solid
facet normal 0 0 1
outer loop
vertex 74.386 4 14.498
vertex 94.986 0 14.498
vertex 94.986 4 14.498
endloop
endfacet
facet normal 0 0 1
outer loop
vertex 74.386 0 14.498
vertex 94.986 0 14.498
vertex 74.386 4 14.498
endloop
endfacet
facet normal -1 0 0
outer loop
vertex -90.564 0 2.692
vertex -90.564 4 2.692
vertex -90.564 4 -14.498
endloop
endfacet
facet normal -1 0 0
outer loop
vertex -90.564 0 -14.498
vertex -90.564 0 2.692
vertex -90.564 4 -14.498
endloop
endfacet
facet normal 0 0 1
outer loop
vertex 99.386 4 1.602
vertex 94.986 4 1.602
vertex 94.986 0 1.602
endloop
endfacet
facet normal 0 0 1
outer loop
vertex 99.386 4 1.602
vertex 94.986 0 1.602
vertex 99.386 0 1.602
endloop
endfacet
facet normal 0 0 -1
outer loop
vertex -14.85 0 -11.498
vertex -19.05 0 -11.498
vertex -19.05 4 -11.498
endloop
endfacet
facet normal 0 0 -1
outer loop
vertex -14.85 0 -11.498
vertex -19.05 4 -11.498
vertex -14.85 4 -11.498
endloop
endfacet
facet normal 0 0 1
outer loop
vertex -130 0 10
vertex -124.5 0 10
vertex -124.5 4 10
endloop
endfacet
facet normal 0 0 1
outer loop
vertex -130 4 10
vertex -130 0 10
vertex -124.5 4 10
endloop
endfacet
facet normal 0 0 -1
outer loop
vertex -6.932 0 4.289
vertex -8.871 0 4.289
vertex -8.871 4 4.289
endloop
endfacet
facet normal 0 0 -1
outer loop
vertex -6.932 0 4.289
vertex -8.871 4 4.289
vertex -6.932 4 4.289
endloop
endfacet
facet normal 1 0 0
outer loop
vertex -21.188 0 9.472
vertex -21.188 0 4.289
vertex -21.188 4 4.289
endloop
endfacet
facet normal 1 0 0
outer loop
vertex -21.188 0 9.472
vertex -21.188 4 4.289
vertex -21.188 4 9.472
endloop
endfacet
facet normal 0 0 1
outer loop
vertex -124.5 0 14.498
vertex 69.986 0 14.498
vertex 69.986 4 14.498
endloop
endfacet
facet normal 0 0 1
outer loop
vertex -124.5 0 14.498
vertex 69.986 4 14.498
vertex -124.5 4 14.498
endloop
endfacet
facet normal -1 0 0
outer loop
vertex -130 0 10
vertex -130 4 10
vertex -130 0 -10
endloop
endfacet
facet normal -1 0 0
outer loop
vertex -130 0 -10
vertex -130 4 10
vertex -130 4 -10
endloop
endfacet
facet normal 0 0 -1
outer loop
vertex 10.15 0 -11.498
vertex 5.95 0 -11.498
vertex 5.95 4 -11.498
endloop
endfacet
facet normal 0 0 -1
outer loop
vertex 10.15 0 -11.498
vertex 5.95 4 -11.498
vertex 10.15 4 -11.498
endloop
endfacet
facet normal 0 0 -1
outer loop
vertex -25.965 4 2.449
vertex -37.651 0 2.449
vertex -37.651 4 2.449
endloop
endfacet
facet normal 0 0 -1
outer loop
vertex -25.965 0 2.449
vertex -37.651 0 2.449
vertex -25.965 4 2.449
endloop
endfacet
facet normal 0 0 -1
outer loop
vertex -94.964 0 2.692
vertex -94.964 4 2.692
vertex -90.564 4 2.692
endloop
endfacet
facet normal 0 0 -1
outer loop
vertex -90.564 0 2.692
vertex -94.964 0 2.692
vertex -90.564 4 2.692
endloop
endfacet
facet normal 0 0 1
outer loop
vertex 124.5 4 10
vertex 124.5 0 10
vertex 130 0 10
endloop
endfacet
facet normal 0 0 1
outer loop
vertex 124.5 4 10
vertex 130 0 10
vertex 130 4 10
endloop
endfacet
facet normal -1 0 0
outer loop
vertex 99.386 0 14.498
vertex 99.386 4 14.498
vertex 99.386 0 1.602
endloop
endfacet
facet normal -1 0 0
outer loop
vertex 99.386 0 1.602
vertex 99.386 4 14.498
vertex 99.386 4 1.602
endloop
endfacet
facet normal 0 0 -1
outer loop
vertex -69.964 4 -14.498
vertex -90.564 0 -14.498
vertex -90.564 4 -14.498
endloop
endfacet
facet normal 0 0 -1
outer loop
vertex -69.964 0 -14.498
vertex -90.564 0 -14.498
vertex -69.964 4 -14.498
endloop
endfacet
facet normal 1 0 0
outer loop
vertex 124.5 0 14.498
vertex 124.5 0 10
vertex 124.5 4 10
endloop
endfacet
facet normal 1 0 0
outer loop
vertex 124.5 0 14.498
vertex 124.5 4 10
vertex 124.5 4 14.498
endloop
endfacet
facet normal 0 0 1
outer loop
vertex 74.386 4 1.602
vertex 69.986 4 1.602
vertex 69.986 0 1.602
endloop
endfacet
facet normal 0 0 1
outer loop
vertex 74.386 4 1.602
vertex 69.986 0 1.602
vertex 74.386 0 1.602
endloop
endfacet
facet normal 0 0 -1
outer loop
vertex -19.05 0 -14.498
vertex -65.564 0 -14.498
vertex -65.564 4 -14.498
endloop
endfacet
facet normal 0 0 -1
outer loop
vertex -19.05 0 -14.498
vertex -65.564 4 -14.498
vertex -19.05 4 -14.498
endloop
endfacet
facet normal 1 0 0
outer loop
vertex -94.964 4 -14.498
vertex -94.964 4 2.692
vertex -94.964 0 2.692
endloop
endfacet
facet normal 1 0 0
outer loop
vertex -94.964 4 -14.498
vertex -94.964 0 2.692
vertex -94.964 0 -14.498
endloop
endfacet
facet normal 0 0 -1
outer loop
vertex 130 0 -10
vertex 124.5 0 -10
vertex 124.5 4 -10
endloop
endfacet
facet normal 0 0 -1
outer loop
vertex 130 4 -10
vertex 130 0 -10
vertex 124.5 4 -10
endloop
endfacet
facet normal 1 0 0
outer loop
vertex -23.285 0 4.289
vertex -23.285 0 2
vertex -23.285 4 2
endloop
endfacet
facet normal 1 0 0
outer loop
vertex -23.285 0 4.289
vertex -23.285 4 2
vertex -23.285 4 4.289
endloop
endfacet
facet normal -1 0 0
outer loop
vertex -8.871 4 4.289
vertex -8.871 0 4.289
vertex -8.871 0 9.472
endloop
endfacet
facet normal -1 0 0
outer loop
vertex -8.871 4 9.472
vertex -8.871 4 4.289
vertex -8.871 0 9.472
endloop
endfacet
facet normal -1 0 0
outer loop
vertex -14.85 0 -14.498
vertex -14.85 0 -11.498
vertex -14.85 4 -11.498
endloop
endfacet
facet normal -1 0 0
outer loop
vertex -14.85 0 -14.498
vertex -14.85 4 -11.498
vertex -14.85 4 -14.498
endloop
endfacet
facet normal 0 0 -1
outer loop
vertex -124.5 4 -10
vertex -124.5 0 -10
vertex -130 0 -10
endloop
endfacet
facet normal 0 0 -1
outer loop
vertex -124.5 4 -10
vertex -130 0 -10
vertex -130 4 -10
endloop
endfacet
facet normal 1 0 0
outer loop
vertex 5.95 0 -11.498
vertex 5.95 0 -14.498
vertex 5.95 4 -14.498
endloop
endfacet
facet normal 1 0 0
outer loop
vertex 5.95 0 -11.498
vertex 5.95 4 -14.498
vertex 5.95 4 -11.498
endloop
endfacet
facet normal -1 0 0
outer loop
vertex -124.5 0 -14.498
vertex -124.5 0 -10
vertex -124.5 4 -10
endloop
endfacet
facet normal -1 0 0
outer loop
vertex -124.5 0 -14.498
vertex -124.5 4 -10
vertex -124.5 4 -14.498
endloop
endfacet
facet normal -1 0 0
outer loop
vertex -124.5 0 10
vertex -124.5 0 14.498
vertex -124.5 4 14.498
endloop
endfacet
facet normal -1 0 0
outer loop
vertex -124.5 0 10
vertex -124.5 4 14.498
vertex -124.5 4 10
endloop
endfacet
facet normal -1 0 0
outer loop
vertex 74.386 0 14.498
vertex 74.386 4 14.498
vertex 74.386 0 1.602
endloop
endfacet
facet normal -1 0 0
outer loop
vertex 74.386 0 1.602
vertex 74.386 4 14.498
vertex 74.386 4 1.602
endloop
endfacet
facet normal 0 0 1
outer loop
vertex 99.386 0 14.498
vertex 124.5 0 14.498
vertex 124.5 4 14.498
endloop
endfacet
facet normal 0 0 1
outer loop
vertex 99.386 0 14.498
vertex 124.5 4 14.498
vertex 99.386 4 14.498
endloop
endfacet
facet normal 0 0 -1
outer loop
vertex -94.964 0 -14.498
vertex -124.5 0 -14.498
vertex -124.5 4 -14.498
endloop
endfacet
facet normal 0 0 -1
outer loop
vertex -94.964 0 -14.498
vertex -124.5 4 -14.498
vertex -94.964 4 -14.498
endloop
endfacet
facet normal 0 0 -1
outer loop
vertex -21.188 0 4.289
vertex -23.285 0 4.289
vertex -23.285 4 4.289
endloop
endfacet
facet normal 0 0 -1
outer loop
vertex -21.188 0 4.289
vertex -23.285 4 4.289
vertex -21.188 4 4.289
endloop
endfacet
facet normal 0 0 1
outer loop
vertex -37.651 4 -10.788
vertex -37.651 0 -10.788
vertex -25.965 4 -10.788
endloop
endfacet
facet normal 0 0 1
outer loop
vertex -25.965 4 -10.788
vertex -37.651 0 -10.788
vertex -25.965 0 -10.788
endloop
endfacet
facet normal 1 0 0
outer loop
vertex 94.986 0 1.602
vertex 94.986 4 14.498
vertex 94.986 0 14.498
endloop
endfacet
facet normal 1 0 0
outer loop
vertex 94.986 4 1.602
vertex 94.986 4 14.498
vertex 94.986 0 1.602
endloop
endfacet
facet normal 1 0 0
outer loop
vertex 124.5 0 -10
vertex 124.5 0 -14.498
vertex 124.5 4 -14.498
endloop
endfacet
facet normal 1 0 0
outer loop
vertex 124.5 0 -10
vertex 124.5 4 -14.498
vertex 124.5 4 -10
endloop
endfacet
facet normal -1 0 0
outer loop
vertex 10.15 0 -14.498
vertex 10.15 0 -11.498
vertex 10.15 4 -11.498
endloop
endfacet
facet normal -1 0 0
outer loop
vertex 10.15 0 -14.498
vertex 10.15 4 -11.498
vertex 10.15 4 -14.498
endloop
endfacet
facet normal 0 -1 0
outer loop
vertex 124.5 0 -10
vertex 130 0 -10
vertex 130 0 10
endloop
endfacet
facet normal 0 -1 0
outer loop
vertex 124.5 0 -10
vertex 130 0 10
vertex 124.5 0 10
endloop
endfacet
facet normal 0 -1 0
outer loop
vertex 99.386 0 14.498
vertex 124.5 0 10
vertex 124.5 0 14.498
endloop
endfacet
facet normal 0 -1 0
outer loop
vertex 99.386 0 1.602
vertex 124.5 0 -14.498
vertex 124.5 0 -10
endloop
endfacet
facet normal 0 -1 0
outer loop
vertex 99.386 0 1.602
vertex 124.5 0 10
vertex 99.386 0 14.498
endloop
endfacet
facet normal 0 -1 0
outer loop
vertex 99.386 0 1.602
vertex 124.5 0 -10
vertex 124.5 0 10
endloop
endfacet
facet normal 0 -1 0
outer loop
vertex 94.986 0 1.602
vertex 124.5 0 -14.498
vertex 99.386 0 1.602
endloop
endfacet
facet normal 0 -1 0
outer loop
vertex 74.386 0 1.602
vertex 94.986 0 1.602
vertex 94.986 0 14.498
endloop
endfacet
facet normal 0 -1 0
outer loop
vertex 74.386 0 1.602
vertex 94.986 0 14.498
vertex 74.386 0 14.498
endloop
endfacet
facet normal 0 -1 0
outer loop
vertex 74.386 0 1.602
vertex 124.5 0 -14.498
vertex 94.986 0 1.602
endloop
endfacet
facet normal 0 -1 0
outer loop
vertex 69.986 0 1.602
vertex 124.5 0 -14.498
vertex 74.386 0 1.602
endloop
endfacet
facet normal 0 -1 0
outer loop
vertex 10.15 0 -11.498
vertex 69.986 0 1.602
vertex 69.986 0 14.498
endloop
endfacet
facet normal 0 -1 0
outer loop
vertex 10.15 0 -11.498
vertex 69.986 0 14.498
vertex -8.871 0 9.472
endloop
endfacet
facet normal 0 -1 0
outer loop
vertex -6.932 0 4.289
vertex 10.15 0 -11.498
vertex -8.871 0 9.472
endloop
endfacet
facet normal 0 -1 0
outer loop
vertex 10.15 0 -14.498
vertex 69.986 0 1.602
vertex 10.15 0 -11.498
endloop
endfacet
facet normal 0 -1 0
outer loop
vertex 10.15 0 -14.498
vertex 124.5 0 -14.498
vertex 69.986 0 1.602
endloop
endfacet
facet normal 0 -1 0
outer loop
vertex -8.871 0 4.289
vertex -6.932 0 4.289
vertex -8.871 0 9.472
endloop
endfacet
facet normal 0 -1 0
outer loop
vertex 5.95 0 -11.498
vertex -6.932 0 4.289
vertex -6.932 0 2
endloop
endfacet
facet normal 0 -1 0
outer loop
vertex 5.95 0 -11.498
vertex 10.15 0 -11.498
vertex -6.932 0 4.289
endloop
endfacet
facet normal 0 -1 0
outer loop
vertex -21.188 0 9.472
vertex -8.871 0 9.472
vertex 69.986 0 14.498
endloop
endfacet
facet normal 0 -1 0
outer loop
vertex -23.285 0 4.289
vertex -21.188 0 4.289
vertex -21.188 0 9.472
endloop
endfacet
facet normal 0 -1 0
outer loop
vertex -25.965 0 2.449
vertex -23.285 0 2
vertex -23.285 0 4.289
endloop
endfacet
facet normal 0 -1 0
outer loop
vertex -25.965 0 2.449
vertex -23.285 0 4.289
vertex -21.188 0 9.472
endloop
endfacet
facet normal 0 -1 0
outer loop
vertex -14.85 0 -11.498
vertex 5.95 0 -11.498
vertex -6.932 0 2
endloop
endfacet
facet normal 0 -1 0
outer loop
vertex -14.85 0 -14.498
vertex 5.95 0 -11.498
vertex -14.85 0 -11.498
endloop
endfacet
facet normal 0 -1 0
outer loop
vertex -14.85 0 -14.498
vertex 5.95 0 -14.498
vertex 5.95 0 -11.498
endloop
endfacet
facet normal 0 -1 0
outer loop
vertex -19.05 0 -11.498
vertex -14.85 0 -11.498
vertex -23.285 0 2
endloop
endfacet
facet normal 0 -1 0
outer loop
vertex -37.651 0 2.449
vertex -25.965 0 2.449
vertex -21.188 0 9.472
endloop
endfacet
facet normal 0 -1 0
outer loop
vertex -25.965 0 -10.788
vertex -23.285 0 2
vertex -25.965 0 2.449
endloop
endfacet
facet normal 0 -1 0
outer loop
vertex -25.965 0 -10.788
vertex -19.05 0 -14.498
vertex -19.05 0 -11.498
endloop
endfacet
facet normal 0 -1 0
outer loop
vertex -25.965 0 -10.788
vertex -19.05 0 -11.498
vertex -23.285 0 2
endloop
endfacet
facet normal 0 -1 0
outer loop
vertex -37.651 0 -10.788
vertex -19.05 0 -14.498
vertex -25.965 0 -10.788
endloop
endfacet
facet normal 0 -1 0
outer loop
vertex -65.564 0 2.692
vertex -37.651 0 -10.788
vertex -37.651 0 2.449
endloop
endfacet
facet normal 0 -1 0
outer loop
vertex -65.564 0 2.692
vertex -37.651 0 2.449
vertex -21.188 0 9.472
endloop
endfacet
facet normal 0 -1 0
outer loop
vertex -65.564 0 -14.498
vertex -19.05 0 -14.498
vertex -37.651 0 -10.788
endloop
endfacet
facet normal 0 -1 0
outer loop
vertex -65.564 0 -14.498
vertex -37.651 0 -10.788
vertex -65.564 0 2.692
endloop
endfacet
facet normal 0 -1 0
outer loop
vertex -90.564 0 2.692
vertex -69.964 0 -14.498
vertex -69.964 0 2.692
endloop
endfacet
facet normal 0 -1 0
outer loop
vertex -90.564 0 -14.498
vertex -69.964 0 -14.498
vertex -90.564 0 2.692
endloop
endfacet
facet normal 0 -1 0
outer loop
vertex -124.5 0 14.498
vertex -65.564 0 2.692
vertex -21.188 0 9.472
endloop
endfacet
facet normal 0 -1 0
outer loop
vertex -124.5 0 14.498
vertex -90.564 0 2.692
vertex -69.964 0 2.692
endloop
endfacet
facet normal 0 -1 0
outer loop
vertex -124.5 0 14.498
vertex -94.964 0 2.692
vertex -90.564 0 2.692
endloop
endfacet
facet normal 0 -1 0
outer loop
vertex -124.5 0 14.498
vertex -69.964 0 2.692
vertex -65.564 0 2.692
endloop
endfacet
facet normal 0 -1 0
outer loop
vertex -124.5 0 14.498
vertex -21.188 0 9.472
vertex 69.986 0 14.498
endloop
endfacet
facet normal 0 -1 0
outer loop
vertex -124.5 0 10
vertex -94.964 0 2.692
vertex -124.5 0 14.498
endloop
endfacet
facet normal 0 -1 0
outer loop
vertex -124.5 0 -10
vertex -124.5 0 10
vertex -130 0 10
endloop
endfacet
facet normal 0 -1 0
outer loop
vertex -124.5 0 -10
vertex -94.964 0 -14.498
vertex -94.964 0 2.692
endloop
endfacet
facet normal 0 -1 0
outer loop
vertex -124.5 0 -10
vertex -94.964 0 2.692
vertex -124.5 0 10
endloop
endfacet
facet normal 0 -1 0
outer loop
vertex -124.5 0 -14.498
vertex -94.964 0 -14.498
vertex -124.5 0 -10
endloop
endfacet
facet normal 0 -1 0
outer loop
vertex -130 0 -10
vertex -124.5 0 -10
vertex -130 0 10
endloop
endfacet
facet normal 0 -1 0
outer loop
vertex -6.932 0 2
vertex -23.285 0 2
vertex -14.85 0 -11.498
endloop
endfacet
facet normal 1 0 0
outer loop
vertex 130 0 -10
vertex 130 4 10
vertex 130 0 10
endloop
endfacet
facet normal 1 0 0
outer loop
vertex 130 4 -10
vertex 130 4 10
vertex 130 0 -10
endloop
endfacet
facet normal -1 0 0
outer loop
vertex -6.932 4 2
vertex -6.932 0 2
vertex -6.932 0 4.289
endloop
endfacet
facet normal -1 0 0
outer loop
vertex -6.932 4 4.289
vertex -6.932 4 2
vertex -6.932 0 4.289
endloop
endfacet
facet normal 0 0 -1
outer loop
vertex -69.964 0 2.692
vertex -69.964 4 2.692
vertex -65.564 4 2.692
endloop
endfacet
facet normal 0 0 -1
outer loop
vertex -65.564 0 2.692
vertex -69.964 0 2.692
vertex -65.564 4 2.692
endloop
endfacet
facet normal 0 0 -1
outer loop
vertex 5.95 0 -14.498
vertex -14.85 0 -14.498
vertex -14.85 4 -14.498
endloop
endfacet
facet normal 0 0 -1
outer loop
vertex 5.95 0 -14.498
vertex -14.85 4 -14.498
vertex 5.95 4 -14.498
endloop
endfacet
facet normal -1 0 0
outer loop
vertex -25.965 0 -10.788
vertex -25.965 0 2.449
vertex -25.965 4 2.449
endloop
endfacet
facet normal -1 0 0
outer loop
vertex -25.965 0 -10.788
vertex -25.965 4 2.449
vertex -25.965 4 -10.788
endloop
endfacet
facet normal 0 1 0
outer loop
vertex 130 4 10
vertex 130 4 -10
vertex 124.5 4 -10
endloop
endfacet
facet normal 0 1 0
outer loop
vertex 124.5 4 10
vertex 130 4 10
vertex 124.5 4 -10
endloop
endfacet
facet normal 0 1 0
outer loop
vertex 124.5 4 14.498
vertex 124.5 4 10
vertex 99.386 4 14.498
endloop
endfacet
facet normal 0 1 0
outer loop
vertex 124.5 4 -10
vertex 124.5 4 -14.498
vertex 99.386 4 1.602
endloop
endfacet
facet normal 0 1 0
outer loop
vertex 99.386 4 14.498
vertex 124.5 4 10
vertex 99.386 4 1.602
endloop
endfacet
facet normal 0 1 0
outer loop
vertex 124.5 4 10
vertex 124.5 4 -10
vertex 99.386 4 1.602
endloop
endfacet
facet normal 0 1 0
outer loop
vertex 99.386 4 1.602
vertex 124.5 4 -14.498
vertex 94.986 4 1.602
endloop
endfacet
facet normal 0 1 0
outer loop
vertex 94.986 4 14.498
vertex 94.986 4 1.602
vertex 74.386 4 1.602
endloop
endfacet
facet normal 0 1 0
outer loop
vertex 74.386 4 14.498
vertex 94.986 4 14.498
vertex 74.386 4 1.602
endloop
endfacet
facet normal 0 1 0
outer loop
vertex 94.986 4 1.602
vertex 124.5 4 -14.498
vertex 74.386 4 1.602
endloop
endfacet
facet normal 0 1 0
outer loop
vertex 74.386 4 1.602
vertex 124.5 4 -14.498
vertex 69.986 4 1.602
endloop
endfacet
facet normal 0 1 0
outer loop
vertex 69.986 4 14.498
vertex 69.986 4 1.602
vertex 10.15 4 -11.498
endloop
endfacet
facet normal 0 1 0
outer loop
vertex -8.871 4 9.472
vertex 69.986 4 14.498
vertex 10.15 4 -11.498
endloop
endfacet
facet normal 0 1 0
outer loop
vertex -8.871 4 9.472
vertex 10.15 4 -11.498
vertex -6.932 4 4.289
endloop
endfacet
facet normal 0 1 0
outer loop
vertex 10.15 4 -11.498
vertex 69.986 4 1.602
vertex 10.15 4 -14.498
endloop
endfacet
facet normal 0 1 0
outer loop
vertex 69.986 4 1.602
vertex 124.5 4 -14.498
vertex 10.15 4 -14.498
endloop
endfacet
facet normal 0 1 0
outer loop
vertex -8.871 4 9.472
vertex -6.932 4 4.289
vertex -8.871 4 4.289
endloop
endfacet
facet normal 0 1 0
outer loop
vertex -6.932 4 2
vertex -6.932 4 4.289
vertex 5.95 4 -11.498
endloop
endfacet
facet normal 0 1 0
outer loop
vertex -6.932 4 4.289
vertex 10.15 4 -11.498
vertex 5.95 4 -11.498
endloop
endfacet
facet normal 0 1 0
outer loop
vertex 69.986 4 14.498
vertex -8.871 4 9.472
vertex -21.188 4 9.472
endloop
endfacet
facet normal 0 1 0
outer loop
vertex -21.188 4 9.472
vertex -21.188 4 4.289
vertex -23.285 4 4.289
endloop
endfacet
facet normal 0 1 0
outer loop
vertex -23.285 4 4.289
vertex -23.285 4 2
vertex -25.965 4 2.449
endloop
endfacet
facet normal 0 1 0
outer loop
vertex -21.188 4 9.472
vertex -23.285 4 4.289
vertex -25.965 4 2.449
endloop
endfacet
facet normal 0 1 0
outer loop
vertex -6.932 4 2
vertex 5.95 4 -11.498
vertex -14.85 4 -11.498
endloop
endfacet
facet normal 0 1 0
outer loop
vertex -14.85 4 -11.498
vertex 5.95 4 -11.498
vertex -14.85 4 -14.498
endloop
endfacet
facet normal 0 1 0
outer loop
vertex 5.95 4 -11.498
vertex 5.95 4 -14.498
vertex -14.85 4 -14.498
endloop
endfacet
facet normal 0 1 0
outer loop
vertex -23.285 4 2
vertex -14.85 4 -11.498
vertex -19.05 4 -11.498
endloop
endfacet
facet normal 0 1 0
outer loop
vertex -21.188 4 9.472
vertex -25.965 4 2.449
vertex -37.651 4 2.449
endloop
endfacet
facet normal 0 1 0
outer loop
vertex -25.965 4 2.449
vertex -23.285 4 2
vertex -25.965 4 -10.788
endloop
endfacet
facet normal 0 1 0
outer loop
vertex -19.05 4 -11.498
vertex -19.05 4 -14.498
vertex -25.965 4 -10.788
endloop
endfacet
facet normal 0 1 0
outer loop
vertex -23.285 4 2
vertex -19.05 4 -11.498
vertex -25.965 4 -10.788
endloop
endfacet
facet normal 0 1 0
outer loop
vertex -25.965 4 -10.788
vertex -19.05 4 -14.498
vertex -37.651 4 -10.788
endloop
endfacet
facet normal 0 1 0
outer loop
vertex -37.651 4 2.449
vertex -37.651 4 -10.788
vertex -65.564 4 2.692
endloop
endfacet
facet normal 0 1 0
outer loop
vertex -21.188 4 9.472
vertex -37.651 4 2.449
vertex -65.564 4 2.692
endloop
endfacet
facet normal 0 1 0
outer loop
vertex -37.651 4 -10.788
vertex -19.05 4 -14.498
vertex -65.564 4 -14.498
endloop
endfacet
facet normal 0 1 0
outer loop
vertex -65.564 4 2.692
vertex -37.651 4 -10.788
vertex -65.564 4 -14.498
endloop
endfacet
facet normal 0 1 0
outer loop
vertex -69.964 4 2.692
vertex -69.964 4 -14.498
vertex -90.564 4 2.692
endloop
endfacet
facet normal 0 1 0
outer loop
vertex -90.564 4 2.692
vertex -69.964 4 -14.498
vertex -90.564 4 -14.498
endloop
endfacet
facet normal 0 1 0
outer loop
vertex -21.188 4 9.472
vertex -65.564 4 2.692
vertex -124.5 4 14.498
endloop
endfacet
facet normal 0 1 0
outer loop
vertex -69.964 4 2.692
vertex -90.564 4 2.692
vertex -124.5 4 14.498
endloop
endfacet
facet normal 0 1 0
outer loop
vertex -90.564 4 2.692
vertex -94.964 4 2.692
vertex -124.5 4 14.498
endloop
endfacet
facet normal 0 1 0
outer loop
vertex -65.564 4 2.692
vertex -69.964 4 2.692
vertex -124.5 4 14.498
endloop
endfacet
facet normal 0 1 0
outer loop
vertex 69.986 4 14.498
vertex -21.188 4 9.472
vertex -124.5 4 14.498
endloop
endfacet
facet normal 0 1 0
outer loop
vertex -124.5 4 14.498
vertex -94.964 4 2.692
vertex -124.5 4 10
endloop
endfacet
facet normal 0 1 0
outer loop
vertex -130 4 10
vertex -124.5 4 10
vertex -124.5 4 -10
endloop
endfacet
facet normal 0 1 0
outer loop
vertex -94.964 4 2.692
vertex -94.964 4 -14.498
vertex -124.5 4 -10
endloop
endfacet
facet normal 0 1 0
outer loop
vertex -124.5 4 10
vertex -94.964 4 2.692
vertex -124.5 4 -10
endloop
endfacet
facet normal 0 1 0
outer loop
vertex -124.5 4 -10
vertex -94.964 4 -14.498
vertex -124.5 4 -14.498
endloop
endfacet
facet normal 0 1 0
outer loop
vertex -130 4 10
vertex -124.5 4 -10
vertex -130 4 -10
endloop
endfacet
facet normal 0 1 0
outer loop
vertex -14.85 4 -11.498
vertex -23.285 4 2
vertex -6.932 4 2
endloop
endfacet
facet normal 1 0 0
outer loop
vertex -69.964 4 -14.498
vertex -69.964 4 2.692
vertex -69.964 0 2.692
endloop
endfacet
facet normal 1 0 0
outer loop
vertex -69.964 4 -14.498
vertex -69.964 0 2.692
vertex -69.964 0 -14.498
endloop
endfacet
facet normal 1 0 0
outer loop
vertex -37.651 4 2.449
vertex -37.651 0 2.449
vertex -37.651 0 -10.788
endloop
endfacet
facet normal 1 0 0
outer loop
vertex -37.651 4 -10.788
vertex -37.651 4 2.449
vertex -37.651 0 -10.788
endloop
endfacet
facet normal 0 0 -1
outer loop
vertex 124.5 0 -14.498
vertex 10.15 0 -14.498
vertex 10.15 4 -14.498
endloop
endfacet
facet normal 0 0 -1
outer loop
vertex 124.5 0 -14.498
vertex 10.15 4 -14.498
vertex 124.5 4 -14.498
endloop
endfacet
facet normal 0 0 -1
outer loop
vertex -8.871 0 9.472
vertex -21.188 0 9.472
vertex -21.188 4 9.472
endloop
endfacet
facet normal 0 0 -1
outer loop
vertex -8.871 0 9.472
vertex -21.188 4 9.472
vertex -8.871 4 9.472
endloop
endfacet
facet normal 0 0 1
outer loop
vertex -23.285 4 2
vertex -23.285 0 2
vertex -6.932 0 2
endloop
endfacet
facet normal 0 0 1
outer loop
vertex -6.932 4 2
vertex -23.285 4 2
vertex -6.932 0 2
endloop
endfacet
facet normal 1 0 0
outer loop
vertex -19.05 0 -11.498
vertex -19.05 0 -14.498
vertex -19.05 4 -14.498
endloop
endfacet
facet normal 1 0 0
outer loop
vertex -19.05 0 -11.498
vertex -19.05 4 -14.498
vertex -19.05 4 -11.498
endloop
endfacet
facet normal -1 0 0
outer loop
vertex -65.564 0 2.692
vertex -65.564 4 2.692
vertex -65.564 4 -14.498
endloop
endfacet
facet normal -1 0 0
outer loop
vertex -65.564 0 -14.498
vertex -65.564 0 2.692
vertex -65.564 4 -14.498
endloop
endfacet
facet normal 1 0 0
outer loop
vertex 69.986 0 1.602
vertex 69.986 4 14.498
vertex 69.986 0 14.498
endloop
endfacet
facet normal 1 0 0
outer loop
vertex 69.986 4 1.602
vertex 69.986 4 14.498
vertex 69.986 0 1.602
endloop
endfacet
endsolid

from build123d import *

# Parameters (mm, degrees)
EXTRUDE_1_DEPTH    = 4
SKETCH_2_W         = 20
SKETCH_2_H         = 4
EXTRUDE_2_DEPTH    = 5.5
SKETCH1_W          = 4.4
SKETCH1_H          = 17.190587951
CUT_EXTRUDE1_DEPTH = 10
LPATTERN1_COUNT    = 2
LPATTERN1_PITCH    = 25
SKETCH3_W          = 11.685912807
SKETCH3_H          = 13.236550351
CUT_EXTRUDE3_DEPTH = 10
SKETCH2_W          = 16.35313114
SKETCH2_H          = 2.289354212
SKETCH2_W_2        = 12.3172739
SKETCH2_H_2        = 5.182620656
CUT_EXTRUDE4_DEPTH = 10
SKETCH4_W          = 4.4
SKETCH4_H          = 12.896988848
CUT_EXTRUDE5_DEPTH = 10
LPATTERN2_COUNT    = 2
LPATTERN2_PITCH    = 25


with BuildPart() as part:
    # Эскиз1 → Бобышка-Вытянуть1 (new body)
    with BuildSketch(Plane(origin=(0, 0, 0), x_dir=(1, 0, 0), z_dir=(0, 1, 0))):
        Polygon((-14.85, 14.498494424), (5.95, 14.498494424), (5.95, 11.498494424), (10.15, 11.498494424), (10.15, 14.498494424), (124.5, 14.498494424), (124.5, -14.498494424), (-124.5, -14.498494424), (-124.5, 14.498494424), (-19.05, 14.498494424), (-19.05, 11.498494424), (-14.85, 11.498494424), align=None)
    extrude(amount=EXTRUDE_1_DEPTH)

    # Эскиз2 → Бобышка-Вытянуть2 (add)
    with BuildSketch(Plane(origin=(124.5, 0, 0), x_dir=(0, 0, -1), z_dir=(1, 0, 0))):
        with Locations((0, 2)):
            Rectangle(SKETCH_2_W, SKETCH_2_H)
    extrude_2 = extrude(amount=EXTRUDE_2_DEPTH)

    # Mirror1: Бобышка-Вытянуть2 across plane
    add(extrude_2.mirror(Plane(origin=(0, 0, 0), x_dir=(0, 0, 1), z_dir=(1, 0, 0))))

    # Sketch1 → Cut-Extrude1 (cut)
    with BuildSketch(Plane(origin=(0, 4, 0), x_dir=(1, 0, 0), z_dir=(0, 1, 0))):
        with Locations((-67.763838692, 5.903200448)):
            Rectangle(SKETCH1_W, SKETCH1_H)
    cut_extrude1 = extrude(amount=-CUT_EXTRUDE1_DEPTH, mode=Mode.SUBTRACT)

    # LPattern1: Cut-Extrude1 ×2
    with Locations(*[(-i * LPATTERN1_PITCH, 0, 0) for i in range(1, LPATTERN1_COUNT)]):
        add(cut_extrude1, mode=Mode.SUBTRACT)

    # Sketch3 → Cut-Extrude3 (cut)
    with BuildSketch(Plane(origin=(0, 0, 0), x_dir=(1, 0, 0), z_dir=(0, 1, 0))):
        with Locations((-31.80775481, 4.169260767)):
            Rectangle(SKETCH3_W, SKETCH3_H)
    extrude(amount=CUT_EXTRUDE3_DEPTH, mode=Mode.SUBTRACT)

    # Sketch2 → Cut-Extrude4 (cut)
    with BuildSketch(Plane.XZ):
        with Locations((-15.10817653, 3.144359058)):
            Rectangle(SKETCH2_W, SKETCH2_H)
        with Locations((-15.029613665, 6.880346492)):
            Rectangle(SKETCH2_W_2, SKETCH2_H_2)
    extrude(amount=-CUT_EXTRUDE4_DEPTH, mode=Mode.SUBTRACT)

    # Sketch4 → Cut-Extrude5 (cut)
    with BuildSketch(Plane(origin=(0, 4, 0), x_dir=(1, 0, 0), z_dir=(0, 1, 0))):
        with Locations((72.185759894, -8.05)):
            Rectangle(SKETCH4_W, SKETCH4_H)
    cut_extrude5 = extrude(amount=-CUT_EXTRUDE5_DEPTH, mode=Mode.SUBTRACT)

    # LPattern2: Cut-Extrude5 ×2
    with Locations(*[(i * LPATTERN2_PITCH, 0, 0) for i in range(1, LPATTERN2_COUNT)]):
        add(cut_extrude5, mode=Mode.SUBTRACT)


solid = part.part
